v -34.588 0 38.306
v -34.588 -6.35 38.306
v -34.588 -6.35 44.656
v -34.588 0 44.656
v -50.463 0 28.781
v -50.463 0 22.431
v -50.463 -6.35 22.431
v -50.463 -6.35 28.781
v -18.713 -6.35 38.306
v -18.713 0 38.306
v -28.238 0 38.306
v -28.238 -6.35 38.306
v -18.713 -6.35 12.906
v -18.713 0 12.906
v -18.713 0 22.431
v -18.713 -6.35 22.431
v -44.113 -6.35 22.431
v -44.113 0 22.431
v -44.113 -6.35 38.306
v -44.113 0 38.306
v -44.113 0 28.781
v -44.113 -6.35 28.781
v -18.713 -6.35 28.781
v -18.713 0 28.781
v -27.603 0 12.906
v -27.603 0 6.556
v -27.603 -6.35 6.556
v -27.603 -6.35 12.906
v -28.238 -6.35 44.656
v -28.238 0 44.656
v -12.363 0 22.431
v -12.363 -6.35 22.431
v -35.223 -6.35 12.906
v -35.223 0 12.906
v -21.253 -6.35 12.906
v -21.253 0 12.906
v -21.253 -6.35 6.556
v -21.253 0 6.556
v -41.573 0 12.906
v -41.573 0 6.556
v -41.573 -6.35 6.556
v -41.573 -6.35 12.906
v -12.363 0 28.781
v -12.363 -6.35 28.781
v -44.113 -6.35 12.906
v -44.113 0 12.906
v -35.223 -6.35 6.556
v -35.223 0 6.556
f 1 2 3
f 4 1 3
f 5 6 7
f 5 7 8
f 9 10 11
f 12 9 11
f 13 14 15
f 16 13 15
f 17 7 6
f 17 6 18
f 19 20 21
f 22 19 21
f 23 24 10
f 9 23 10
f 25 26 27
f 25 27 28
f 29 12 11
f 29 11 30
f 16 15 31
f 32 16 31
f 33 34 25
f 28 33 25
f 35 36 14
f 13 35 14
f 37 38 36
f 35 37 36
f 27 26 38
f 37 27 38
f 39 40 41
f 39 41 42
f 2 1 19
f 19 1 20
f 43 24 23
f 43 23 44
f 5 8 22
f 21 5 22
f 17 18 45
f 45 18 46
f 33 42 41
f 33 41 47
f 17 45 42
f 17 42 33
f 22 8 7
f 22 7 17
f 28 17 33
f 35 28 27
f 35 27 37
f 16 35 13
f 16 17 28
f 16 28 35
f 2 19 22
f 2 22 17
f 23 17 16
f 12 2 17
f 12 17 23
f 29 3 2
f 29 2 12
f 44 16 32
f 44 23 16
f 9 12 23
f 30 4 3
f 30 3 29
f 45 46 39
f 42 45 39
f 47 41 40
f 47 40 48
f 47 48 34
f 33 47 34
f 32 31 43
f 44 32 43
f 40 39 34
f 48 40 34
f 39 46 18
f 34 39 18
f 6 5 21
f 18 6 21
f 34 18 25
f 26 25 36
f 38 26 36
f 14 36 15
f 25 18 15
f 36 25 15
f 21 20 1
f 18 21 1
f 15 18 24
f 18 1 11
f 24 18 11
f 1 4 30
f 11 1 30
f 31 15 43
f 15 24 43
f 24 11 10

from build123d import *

# Parameters (mm, degrees)
F0_W     = 6.35
F0_H     = 6.35
F1_DEPTH = 6.35


with BuildPart() as f1:
    # F0 (on Front) → F1 (new body)
    with BuildSketch(Plane.XZ):
        Polygon((-34.587686, 38.306355), (-44.112686, 38.306355), (-44.112686, 28.781355), (-44.112686, 22.431355), (-44.112686, 12.906355), (-41.572686, 12.906355), (-35.222686, 12.906355), (-27.602686, 12.906355), (-21.252686, 12.906355), (-18.712686, 12.906355), (-18.712686, 22.431355), (-18.712686, 28.781355), (-18.712686, 38.306355), (-28.237686, 38.306355), align=None)
        with Locations((-31.412686, 41.481355)):
            Rectangle(F0_W, F0_H)
        with Locations((-47.287686, 25.606355)):
            Rectangle(F0_W, F0_H)
        with Locations((-15.537686, 25.606355)):
            Rectangle(F0_W, F0_H)
        with Locations((-38.397686, 9.731355)):
            Rectangle(F0_W, F0_H)
        with Locations((-24.427686, 9.731355)):
            Rectangle(F0_W, F0_H)
    extrude(amount=F1_DEPTH)


solid = f1.part
